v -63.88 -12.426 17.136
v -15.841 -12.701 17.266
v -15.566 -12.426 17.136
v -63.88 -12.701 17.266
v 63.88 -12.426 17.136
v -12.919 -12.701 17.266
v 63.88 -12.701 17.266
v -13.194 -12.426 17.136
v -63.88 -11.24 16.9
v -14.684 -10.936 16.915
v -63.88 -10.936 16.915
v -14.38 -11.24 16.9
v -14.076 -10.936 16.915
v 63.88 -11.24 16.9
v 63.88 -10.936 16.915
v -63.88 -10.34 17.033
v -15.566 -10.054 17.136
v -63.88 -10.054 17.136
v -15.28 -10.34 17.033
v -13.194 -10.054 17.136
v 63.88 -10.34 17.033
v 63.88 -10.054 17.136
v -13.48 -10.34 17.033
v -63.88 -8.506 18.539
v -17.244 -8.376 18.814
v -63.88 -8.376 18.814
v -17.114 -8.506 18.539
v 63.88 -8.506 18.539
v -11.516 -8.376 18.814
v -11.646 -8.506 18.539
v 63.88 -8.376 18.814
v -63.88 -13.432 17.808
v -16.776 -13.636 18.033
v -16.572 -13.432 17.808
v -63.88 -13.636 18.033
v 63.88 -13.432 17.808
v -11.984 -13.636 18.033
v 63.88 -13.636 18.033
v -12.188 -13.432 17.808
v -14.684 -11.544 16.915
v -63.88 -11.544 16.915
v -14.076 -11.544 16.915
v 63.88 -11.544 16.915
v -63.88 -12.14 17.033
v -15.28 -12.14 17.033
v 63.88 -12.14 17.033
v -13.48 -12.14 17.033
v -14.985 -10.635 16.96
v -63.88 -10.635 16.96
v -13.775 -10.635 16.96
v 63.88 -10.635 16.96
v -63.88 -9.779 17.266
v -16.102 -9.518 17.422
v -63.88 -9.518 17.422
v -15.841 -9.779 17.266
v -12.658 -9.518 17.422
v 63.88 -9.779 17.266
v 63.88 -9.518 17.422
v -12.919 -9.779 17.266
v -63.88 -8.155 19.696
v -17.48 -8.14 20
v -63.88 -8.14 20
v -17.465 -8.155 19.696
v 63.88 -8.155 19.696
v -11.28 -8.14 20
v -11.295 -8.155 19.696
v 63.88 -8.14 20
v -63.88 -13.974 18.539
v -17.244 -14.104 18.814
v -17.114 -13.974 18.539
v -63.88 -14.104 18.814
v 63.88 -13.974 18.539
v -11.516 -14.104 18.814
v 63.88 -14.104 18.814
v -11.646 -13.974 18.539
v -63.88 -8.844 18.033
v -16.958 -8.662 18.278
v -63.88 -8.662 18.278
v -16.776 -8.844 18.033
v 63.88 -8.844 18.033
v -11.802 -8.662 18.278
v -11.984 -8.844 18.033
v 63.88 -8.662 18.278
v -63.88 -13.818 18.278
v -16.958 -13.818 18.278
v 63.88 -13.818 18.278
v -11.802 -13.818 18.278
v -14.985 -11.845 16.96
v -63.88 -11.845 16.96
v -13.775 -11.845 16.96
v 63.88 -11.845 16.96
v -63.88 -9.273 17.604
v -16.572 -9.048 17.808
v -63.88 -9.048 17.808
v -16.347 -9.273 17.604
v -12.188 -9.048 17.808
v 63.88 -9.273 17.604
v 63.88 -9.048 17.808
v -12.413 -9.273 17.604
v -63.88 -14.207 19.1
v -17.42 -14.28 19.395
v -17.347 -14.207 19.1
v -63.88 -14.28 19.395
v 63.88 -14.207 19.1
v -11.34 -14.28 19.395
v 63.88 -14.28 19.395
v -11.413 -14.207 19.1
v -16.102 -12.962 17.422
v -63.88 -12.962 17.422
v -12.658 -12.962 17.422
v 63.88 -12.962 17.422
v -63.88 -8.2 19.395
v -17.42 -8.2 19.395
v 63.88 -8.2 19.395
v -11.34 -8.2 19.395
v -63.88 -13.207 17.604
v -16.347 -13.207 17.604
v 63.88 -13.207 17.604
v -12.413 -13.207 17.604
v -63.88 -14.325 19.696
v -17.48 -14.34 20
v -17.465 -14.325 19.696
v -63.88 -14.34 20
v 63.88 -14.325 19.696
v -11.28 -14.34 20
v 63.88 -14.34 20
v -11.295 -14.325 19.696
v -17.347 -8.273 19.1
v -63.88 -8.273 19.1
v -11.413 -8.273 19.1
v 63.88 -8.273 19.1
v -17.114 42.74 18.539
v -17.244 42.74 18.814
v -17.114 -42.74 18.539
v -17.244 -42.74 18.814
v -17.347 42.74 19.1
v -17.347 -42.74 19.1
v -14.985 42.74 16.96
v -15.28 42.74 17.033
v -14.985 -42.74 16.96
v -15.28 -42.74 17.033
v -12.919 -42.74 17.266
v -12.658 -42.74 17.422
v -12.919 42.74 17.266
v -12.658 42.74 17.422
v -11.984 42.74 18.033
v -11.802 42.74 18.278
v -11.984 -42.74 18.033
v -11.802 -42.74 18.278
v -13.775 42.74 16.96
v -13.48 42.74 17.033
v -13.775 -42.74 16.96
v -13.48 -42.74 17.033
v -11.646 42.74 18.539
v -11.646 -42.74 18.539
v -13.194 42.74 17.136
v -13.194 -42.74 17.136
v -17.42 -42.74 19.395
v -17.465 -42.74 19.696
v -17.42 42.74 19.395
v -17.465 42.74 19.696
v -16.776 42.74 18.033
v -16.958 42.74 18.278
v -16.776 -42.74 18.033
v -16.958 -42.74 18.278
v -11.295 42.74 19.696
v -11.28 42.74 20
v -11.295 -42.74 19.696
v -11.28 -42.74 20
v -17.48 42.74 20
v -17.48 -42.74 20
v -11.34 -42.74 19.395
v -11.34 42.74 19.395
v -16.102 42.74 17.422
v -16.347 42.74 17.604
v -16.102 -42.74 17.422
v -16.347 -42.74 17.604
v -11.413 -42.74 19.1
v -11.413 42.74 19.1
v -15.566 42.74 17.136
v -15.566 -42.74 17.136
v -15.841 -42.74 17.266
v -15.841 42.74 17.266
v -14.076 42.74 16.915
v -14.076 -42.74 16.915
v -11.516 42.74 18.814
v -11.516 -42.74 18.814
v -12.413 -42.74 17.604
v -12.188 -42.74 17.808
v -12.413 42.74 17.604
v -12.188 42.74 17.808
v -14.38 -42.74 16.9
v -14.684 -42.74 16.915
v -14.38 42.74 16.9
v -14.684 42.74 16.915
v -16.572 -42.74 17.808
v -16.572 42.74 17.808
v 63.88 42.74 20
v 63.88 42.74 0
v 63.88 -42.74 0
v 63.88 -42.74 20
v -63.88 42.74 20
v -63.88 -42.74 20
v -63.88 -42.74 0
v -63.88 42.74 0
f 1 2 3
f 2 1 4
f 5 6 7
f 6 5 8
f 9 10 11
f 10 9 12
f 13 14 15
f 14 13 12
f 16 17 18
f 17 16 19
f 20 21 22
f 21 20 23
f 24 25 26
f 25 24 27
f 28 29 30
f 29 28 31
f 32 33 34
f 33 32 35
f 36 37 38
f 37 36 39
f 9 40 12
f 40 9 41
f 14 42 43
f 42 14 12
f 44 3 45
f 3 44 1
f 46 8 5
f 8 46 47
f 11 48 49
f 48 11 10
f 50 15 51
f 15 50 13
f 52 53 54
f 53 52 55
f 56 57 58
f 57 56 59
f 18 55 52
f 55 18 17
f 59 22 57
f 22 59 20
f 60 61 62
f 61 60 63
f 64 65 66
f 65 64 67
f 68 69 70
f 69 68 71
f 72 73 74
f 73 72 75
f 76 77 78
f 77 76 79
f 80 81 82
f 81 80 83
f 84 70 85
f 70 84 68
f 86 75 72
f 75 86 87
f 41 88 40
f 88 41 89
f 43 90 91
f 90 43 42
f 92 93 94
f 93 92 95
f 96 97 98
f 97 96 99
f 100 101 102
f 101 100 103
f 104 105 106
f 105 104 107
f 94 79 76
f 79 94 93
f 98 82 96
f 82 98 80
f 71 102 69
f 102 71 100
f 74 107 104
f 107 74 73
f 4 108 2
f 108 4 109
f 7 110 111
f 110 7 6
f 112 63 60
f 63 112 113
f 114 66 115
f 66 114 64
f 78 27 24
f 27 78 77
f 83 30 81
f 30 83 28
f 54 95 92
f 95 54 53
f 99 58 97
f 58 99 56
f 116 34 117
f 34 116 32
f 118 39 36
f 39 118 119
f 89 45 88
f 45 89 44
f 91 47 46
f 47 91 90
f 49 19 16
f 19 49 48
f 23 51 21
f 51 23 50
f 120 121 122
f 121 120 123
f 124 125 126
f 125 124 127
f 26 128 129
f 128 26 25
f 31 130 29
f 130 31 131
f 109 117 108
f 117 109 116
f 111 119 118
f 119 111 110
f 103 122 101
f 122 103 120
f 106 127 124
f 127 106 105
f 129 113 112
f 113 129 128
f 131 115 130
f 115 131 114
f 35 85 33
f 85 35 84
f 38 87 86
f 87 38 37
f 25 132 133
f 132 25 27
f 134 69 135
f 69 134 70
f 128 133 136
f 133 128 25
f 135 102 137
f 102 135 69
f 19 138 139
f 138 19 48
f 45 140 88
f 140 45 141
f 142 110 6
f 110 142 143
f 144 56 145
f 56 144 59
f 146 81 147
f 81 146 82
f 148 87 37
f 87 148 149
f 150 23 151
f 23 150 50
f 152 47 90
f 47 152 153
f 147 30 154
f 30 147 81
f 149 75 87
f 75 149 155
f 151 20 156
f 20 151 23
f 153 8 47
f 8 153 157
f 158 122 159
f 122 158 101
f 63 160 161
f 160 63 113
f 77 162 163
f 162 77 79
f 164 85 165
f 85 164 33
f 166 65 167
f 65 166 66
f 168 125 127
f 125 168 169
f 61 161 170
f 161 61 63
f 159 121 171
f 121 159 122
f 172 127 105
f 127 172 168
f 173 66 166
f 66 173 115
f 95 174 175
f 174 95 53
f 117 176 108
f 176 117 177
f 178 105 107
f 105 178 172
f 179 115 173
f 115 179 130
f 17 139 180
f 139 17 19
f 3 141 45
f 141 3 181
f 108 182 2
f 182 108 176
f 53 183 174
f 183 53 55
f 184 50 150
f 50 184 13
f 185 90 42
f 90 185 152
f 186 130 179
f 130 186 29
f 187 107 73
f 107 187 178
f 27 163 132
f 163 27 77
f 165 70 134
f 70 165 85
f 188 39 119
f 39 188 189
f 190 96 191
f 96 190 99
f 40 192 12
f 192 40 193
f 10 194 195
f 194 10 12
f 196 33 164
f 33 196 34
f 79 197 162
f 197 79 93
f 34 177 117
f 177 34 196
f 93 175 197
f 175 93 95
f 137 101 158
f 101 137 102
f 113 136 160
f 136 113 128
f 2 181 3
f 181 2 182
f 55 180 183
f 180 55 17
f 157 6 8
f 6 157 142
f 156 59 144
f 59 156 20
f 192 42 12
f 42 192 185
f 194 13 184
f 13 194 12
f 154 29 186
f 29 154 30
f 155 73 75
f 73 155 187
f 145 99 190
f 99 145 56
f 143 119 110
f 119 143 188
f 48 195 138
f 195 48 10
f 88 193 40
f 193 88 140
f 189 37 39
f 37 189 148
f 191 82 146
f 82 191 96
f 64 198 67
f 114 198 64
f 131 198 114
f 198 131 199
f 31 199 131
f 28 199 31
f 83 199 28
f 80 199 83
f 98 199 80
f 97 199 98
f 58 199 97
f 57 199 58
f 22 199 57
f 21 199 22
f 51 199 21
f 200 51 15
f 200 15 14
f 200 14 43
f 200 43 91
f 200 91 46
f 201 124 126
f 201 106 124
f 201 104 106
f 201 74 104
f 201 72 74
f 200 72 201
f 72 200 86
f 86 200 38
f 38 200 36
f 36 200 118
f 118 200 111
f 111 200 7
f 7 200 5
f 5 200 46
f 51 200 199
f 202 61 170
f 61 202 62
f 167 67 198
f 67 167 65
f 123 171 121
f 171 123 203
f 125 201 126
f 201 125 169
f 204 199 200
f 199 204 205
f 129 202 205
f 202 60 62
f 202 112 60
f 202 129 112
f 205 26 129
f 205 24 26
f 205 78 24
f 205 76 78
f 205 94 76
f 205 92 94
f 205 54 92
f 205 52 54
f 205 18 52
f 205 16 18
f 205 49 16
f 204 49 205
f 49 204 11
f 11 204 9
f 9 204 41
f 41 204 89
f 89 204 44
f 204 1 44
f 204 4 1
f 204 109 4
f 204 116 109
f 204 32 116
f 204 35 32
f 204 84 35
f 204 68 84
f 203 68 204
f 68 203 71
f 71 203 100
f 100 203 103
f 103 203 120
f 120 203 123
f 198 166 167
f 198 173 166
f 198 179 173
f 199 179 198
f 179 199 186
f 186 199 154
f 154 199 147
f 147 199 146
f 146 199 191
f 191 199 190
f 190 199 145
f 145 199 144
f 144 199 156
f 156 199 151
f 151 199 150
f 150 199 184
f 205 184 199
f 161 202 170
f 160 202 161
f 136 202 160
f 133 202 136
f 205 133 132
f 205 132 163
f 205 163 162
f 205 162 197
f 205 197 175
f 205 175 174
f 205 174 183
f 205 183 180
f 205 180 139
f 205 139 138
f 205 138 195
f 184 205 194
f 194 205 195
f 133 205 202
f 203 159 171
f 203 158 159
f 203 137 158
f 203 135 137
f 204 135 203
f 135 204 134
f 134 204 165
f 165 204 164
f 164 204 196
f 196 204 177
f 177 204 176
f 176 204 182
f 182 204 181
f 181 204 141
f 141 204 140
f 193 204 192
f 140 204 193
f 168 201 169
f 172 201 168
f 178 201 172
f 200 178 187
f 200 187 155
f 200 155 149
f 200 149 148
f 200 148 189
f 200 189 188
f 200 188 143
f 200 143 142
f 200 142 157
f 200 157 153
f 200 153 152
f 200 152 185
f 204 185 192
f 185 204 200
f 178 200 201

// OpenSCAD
// Built by bench/smallmodels/features/compiler.py from a list of features.
$fn = 64;
difference() {
  union() {
    translate([0, 0, 0]) translate([-63.88, -42.74, 0]) cube([127.76, 85.48, 20]);
  }
  union() {
    translate([-14.38, -11.24, 20]) rotate([0, 0, 0]) rotate([0, 90, 0]) cylinder(d = 6.2, h = 1080, center = true);
    translate([-14.38, -11.24, 20]) rotate([0, 0, 0]) rotate([90, 0, 0]) cylinder(d = 6.2, h = 1080, center = true);
  }
}
